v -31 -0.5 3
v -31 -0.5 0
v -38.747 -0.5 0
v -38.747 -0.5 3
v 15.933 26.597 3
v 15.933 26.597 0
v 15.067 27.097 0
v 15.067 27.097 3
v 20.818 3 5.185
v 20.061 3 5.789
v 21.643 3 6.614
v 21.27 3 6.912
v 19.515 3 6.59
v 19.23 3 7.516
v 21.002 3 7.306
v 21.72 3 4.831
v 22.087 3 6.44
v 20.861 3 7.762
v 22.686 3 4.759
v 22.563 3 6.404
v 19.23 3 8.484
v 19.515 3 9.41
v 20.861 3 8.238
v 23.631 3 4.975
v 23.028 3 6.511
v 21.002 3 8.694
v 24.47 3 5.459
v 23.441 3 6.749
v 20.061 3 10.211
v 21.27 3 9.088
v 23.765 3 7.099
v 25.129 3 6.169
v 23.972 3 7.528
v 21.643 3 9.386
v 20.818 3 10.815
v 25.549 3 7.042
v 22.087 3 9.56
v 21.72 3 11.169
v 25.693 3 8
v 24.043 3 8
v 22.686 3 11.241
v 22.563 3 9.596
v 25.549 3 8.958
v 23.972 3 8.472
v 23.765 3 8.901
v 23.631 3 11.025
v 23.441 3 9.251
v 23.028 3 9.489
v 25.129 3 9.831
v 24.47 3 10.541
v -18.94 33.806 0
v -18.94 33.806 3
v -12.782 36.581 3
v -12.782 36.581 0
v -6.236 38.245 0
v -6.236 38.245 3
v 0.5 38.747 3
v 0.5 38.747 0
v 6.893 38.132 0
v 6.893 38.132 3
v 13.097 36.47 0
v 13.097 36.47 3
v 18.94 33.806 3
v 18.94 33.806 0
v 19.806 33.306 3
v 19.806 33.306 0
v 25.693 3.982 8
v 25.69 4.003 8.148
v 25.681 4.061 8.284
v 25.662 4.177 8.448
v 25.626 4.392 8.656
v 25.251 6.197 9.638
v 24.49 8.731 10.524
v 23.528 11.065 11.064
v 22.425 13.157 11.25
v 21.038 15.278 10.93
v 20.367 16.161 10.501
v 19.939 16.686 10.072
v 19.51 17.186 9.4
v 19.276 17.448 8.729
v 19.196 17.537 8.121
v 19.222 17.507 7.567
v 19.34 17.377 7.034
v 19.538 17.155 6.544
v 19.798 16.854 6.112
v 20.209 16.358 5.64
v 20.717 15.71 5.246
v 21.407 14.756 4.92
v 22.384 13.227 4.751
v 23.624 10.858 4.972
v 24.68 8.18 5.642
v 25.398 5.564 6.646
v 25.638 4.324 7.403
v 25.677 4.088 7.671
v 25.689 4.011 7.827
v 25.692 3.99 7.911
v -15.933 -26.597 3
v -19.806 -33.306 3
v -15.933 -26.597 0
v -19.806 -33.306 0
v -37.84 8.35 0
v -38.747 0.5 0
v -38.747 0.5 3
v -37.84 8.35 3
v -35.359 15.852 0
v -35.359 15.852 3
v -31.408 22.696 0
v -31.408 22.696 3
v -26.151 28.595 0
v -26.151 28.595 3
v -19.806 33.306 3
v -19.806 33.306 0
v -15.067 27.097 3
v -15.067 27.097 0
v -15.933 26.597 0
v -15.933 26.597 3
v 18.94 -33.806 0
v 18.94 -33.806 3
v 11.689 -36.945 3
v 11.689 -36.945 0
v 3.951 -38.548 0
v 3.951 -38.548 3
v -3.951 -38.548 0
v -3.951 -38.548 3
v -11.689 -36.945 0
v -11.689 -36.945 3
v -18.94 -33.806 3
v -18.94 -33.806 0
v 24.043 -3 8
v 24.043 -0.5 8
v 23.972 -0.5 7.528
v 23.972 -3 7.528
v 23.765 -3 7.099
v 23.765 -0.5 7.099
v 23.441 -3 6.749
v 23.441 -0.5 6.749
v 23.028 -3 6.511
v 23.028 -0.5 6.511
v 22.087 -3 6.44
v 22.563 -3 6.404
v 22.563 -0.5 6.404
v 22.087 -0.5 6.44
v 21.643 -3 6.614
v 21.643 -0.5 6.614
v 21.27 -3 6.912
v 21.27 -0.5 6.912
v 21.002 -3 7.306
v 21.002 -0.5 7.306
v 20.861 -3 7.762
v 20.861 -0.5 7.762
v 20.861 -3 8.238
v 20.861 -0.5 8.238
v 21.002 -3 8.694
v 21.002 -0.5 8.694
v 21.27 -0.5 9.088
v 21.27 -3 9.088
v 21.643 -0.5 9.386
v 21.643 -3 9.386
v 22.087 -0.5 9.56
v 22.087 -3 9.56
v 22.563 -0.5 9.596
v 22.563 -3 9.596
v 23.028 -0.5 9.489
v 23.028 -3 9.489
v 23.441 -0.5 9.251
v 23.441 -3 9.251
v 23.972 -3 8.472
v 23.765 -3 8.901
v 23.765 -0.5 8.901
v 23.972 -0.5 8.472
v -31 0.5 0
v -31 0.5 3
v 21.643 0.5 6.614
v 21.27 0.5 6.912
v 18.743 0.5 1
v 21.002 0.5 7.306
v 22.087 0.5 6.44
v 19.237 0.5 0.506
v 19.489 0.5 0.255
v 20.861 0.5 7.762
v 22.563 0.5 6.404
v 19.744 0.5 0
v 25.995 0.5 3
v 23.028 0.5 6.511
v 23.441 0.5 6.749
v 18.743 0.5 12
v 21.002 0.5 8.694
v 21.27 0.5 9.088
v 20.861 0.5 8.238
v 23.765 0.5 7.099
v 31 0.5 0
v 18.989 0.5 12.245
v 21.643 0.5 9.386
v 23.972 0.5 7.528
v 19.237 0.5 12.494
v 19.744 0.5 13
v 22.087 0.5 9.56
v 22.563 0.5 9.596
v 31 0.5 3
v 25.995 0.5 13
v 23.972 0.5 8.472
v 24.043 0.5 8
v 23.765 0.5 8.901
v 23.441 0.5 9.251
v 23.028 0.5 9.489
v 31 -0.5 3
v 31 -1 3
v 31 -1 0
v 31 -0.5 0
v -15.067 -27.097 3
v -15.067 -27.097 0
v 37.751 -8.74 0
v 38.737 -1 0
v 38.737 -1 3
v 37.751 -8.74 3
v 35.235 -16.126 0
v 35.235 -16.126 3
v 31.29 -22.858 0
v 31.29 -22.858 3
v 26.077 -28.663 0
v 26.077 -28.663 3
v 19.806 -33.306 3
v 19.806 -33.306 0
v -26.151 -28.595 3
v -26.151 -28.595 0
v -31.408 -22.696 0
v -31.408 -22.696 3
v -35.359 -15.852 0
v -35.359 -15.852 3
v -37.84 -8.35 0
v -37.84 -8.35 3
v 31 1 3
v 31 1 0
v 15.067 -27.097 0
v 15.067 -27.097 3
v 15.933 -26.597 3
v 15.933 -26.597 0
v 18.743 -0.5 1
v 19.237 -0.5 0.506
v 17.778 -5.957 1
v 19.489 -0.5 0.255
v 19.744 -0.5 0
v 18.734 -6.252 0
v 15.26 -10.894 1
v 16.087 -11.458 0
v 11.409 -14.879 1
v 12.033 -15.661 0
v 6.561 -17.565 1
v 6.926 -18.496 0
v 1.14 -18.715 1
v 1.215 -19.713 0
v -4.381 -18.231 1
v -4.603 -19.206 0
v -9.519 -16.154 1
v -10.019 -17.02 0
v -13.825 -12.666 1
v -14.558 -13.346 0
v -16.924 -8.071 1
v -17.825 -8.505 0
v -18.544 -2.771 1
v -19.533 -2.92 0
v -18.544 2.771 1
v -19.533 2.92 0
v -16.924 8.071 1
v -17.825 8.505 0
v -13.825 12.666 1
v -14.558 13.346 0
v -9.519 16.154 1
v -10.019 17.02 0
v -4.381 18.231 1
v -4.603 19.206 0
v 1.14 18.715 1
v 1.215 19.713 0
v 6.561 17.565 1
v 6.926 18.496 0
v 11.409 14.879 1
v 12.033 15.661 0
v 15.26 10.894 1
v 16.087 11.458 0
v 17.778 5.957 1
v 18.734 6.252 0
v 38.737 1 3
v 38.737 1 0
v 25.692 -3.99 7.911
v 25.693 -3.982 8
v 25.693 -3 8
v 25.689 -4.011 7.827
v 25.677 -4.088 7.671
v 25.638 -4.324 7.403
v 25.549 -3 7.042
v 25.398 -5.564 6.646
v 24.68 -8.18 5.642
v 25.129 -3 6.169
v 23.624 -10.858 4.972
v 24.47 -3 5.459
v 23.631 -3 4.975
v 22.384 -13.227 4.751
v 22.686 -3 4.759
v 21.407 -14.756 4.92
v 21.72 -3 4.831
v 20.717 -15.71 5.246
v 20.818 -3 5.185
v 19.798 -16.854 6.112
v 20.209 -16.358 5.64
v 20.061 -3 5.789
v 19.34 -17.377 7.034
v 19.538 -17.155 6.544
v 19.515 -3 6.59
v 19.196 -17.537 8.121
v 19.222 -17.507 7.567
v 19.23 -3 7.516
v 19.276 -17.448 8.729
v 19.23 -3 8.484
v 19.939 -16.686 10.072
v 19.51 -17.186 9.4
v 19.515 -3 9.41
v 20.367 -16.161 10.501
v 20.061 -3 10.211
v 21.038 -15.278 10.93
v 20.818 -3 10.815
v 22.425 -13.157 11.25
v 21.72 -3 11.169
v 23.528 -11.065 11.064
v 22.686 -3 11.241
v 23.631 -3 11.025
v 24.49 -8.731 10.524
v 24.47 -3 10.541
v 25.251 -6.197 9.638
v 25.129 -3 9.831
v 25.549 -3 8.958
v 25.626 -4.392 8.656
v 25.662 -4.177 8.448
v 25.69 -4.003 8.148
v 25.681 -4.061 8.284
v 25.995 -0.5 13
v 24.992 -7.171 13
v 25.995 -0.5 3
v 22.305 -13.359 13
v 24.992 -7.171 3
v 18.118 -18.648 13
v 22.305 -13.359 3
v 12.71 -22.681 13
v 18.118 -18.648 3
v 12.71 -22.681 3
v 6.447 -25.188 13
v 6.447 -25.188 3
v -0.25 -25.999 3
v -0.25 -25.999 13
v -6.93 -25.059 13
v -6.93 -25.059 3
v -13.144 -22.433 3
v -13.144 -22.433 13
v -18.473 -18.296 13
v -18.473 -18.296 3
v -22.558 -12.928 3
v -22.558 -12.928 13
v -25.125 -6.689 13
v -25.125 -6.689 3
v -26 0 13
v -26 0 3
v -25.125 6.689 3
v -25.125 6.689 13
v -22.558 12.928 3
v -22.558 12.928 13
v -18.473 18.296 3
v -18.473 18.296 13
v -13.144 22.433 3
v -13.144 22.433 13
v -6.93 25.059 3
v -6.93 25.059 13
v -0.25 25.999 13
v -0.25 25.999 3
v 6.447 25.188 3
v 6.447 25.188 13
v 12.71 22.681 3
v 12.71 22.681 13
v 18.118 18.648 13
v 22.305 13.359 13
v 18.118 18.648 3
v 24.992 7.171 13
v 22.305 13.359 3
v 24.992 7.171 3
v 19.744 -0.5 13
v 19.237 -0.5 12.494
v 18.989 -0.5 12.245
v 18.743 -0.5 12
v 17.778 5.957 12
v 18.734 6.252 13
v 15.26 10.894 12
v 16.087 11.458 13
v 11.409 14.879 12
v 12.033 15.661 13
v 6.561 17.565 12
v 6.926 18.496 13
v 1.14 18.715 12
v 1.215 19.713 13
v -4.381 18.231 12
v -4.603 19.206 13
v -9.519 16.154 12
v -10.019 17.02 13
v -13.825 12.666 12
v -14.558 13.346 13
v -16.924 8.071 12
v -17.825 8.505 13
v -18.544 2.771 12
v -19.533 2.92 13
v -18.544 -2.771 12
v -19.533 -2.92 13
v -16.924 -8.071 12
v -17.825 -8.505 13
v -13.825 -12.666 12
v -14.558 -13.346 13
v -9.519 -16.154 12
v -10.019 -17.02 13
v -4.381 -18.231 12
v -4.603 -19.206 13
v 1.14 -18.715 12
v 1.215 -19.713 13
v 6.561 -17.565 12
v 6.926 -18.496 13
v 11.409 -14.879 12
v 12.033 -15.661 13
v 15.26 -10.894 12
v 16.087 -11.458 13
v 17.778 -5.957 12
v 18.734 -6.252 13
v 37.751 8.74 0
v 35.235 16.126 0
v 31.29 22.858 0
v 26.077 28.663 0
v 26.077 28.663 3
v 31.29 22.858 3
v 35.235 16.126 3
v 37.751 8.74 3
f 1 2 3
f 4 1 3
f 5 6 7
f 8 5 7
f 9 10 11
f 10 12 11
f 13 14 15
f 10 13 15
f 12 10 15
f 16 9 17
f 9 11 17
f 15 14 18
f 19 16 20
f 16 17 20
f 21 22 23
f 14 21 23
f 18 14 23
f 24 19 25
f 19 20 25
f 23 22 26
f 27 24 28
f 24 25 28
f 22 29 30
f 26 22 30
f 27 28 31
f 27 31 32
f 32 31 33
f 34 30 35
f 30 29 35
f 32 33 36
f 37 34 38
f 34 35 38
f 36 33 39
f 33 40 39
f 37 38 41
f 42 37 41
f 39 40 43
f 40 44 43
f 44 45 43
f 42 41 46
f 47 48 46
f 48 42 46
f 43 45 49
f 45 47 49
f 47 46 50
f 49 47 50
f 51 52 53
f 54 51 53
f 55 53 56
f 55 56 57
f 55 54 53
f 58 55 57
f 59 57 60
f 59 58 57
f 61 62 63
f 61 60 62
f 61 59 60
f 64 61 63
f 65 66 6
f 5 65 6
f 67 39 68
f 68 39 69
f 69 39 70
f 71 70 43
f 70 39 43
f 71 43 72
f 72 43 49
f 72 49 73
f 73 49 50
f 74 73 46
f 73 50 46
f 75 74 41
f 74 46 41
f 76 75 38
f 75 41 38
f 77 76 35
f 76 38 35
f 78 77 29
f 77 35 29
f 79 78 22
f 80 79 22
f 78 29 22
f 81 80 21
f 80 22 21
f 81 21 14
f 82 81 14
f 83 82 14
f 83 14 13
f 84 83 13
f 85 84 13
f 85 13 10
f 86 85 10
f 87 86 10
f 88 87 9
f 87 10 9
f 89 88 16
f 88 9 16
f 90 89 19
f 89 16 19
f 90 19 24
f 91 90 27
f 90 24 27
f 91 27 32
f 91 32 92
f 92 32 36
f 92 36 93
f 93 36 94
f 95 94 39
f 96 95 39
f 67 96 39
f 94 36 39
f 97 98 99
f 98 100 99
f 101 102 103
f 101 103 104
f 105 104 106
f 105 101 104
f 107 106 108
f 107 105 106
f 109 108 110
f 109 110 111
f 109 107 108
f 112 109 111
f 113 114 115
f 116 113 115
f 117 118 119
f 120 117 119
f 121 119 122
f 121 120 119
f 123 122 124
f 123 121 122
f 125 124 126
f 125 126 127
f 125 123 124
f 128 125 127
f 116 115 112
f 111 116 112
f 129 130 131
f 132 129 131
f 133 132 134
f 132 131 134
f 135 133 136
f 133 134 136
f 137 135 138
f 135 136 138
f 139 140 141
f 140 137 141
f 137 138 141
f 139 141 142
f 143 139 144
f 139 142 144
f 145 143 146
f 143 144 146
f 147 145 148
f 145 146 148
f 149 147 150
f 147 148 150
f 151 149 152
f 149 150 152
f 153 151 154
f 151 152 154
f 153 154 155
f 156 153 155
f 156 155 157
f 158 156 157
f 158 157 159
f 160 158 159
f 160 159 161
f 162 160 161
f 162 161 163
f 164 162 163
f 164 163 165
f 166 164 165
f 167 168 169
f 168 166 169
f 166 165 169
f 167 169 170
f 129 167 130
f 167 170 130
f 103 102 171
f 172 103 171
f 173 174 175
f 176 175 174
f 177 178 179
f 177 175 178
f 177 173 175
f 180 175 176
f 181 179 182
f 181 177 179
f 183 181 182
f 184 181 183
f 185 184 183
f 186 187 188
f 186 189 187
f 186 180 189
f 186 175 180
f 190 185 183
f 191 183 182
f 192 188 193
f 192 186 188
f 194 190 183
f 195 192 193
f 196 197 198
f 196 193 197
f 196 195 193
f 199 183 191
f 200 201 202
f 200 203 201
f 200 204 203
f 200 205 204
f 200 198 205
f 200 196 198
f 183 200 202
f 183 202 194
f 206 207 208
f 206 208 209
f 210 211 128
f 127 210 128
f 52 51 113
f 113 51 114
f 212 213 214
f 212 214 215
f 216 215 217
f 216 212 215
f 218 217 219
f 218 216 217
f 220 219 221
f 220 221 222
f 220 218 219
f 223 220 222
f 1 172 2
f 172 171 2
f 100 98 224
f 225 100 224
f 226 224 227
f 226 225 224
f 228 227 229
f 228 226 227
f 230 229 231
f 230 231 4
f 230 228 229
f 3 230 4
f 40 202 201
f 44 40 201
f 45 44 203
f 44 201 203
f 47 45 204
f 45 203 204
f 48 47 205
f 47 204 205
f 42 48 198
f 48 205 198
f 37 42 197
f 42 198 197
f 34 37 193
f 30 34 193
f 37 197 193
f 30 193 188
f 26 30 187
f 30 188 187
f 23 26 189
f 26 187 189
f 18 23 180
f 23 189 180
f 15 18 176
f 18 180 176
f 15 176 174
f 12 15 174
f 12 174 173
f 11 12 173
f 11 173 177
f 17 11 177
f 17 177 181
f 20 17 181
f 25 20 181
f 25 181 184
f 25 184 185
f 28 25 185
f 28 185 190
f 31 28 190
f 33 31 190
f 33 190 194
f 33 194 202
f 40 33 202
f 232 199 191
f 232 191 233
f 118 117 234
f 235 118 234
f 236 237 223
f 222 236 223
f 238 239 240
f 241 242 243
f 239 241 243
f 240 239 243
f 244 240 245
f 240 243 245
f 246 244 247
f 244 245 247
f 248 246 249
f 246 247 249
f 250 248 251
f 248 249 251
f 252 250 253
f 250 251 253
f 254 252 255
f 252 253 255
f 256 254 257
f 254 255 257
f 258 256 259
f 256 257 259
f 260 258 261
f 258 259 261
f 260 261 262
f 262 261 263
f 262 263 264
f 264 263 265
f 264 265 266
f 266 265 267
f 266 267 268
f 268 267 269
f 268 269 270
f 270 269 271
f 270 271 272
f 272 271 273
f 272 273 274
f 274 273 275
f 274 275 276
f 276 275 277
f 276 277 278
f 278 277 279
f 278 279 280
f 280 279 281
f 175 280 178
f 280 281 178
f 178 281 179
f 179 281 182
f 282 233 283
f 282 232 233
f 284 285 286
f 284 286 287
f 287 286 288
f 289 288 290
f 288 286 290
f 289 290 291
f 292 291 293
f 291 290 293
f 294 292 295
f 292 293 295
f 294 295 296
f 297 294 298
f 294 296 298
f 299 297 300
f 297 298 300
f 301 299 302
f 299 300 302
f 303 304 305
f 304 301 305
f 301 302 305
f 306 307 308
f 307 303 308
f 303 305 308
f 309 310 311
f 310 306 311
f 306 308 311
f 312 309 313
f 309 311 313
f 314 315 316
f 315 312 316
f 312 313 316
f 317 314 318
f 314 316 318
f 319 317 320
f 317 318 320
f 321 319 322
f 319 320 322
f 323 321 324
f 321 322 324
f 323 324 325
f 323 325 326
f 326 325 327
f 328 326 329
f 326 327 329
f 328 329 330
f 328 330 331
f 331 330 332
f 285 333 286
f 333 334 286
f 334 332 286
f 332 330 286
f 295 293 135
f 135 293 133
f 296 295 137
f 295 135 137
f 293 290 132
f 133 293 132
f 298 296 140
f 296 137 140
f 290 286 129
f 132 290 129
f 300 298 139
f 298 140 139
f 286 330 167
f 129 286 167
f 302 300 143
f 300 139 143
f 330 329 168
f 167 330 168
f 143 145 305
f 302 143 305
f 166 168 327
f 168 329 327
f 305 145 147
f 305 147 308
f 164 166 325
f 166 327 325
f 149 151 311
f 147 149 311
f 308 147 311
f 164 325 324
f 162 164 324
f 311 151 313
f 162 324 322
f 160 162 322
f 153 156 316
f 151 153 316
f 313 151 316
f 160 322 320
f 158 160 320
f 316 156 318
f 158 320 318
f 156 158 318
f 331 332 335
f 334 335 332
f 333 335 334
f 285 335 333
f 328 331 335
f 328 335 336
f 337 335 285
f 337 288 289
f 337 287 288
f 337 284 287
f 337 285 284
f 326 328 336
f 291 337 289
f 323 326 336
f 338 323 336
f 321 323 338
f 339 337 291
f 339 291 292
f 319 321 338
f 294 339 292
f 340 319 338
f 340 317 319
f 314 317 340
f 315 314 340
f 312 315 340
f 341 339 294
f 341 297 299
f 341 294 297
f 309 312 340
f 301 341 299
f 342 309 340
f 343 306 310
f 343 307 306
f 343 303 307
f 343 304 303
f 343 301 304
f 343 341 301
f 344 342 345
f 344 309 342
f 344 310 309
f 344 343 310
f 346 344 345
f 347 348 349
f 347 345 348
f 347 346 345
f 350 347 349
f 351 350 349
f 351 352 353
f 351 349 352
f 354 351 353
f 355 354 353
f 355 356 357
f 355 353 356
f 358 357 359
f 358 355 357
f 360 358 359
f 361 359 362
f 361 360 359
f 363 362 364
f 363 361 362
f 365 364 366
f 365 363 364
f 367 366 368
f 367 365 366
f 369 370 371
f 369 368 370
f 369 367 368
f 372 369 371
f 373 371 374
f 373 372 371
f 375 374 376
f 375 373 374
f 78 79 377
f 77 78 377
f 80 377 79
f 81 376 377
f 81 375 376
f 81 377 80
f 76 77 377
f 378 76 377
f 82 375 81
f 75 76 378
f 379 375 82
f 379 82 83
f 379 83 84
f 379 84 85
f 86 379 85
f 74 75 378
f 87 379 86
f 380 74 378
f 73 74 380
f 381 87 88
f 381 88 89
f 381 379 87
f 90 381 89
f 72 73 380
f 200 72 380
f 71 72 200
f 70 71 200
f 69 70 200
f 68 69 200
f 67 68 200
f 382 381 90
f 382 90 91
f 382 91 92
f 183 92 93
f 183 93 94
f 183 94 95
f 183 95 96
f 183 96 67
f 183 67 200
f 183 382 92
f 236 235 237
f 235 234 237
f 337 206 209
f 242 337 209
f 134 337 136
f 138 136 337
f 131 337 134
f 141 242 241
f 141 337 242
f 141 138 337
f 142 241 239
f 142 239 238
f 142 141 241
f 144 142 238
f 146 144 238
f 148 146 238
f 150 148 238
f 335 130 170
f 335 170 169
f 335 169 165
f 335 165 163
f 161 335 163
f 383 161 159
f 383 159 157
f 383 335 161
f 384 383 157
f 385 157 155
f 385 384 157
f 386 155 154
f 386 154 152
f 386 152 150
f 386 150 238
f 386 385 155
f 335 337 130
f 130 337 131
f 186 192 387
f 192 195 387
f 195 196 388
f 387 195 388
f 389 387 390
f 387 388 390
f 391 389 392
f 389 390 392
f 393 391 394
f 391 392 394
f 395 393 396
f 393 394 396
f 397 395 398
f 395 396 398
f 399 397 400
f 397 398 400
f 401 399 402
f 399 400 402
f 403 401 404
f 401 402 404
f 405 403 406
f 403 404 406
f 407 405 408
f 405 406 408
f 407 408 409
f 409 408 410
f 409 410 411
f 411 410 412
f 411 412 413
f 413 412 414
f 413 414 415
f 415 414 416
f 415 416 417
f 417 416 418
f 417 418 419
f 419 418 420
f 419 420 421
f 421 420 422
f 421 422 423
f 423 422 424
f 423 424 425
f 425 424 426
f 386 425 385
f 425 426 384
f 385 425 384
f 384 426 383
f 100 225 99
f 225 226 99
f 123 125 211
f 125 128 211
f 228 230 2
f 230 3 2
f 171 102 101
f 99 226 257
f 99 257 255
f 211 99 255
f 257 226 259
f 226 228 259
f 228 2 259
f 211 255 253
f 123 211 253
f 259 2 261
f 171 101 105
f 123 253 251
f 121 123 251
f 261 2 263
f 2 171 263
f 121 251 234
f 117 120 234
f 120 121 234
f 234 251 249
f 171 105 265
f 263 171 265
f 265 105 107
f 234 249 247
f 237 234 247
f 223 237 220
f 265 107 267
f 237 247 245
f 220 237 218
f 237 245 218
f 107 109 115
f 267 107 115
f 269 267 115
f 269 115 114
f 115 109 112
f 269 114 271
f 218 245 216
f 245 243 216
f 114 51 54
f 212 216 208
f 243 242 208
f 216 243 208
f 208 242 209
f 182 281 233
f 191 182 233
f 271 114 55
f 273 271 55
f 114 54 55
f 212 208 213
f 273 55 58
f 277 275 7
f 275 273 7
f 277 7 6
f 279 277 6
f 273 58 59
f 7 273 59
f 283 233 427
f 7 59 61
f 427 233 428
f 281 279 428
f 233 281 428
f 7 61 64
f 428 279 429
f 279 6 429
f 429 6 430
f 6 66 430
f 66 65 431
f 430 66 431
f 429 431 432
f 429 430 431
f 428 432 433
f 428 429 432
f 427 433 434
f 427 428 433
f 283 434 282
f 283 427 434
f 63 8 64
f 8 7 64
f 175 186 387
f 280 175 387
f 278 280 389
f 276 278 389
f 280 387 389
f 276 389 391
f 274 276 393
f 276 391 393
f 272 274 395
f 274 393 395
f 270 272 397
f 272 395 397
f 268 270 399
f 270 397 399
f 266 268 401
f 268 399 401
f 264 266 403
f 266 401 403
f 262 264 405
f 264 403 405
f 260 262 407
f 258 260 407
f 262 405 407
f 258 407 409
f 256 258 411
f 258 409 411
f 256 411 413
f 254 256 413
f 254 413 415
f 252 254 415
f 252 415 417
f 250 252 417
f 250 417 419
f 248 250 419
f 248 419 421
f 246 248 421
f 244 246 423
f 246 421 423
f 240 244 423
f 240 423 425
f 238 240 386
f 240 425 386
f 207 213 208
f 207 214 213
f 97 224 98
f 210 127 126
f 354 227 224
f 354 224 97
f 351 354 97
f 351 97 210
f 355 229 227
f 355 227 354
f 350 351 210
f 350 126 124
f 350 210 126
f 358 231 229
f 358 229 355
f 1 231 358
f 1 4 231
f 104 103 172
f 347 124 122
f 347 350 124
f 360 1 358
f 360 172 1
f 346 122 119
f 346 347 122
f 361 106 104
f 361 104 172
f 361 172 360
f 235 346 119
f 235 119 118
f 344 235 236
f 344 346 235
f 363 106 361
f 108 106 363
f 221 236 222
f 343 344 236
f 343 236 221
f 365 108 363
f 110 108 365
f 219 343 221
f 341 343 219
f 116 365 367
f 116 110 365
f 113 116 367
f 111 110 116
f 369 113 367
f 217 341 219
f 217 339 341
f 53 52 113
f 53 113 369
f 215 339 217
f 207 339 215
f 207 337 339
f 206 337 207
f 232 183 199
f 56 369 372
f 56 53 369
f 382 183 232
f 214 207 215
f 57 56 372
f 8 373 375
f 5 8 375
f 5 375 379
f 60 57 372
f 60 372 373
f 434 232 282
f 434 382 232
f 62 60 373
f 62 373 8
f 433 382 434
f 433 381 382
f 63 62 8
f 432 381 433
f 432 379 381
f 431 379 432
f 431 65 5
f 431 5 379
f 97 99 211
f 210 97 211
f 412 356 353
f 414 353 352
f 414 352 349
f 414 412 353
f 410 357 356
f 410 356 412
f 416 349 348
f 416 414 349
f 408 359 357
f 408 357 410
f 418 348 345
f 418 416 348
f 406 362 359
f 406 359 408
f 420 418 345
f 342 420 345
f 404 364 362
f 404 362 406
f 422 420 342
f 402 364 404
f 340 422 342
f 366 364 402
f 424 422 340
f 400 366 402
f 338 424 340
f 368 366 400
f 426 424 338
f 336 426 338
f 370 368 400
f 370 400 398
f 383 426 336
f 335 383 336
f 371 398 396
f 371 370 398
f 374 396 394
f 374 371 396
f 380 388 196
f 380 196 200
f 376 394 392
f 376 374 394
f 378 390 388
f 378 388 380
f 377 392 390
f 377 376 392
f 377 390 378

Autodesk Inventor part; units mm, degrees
ref_plane "YZ Plane" through (0, 0, 0) normal (1, 0, 0) x (0, 1, 0)
ref_plane "XZ Plane" through (0, 0, 0) normal (0, 1, 0) x (-1, 0, 0)
sketch "Sketch1" plane through (0, 0, 0) normal (0, 0, 1) x (1, 0, 0)
  circle A0 centre (0, 0) radius 38.75
  line L0 (-0.5, 39) -> (0.5, 39)
  line L1 (0.5, 39) -> (0.5, 31)
  line L2 (0.5, 31) -> (-0.5, 31)
  line L3 (-0.5, 31) -> (-0.5, 39)
  line L4 (-15.933, 26.5968) -> (-19.933, 33.525)
  line L5 (-19.067, 34.025) -> (-15.067, 27.0968)
  line L6 (-15.067, 27.0968) -> (-15.933, 26.5968)
  line L7 (-19.933, 33.525) -> (-19.067, 34.025)
  line L8 (-27.0968, 15.067) -> (-34.025, 19.067)
  line L9 (-33.525, 19.933) -> (-26.5968, 15.933)
  line L10 (-26.5968, 15.933) -> (-27.0968, 15.067)
  line L11 (-34.025, 19.067) -> (-33.525, 19.933)
  line L12 (-31, -0.5) -> (-39, -0.5)
  line L13 (-39, 0.5) -> (-31, 0.5)
  line L14 (-31, 0.5) -> (-31, -0.5)
  line L15 (-39, -0.5) -> (-39, 0.5)
  line L16 (-26.5968, -15.933) -> (-33.525, -19.933)
  line L17 (-34.025, -19.067) -> (-27.0968, -15.067)
  line L18 (-27.0968, -15.067) -> (-26.5968, -15.933)
  line L19 (-33.525, -19.933) -> (-34.025, -19.067)
  line L20 (-15.067, -27.0968) -> (-19.067, -34.025)
  line L21 (-19.933, -33.525) -> (-15.933, -26.5968)
  line L22 (-15.933, -26.5968) -> (-15.067, -27.0968)
  line L23 (-19.067, -34.025) -> (-19.933, -33.525)
  line L24 (0.5, -31) -> (0.5, -39)
  line L25 (-0.5, -39) -> (-0.5, -31)
  line L26 (-0.5, -31) -> (0.5, -31)
  line L27 (0.5, -39) -> (-0.5, -39)
  line L28 (15.933, -26.5968) -> (19.933, -33.525)
  line L29 (19.067, -34.025) -> (15.067, -27.0968)
  line L30 (15.067, -27.0968) -> (15.933, -26.5968)
  line L31 (19.933, -33.525) -> (19.067, -34.025)
  line L32 (27.0968, -15.067) -> (34.025, -19.067)
  line L33 (33.525, -19.933) -> (26.5968, -15.933)
  line L34 (26.5968, -15.933) -> (27.0968, -15.067)
  line L35 (34.025, -19.067) -> (33.525, -19.933)
  line L36 (31, 0.5) -> (39, 0.5)
  line L37 (39, -0.5) -> (31, -0.5)
  line L38 (31, -0.5) -> (31, 0.5)
  line L39 (39, 0.5) -> (39, -0.5)
  line L40 (26.5968, 15.933) -> (33.525, 19.933)
  line L41 (34.025, 19.067) -> (27.0968, 15.067)
  line L42 (27.0968, 15.067) -> (26.5968, 15.933)
  line L43 (33.525, 19.933) -> (34.025, 19.067)
  line L44 (15.067, 27.0968) -> (19.067, 34.025)
  line L45 (19.933, 33.525) -> (15.933, 26.5968)
  line L46 (15.933, 26.5968) -> (15.067, 27.0968)
  line L47 (19.067, 34.025) -> (19.933, 33.525)
  point P0 (0, 31)
  point P1 (-0.5, 38.7468)
  point P2 (0.5, 38.7468)
  point P3 (-15.5, 26.8468)
  point P4 (-26.8468, 15.5)
  point P5 (-31, 0)
  point P6 (-26.8468, -15.5)
  point P7 (-15.5, -26.8468)
  point P8 (0, -31)
  point P9 (15.5, -26.8468)
  point P10 (26.8468, -15.5)
  point P11 (31, 0)
  point P12 (26.8468, 15.5)
  point P13 (15.5, 26.8468)
  point P14 (-18.9404, 33.8057)
  point P15 (-19.8064, 33.3057)
  point P16 (-33.3057, 19.8064)
  point P17 (-33.8057, 18.9404)
  point P18 (-38.7468, 0.5)
  point P19 (-38.7468, -0.5)
  point P20 (-33.8057, -18.9404)
  point P21 (-33.3057, -19.8064)
  point P22 (-19.8064, -33.3057)
  point P23 (-18.9404, -33.8057)
  point P24 (-0.5, -38.7468)
  point P25 (0.5, -38.7468)
  point P26 (18.9404, -33.8057)
  point P27 (19.8064, -33.3057)
  point P28 (33.3057, -19.8064)
  point P29 (33.8057, -18.9404)
  point P30 (38.7468, -0.5)
  point P31 (38.7468, 0.5)
  point P32 (33.8057, 18.9404)
  point P33 (33.3057, 19.8064)
  point P34 (19.8064, 33.3057)
  point P35 (18.9404, 33.8057)
  dimension "d0" = 77.5
  dimension "d3" = 0.5
  dimension "d4" = 31
  dimension "d9" = 360
extrude "Extrusion1" add sketch "Sketch1" along normal blind 3 contours L36 L38 L37 A0 L32 L34 L33 L28 L30 L29 L24 L26 L25 L20 L22 L21 L16 L18 L17 L12 L14 L13 L8 L10 L9 L4 L6 L5 L3 L2 L1 L44 L46 L45 L40 L42 L41 | L41 L42 L40 A0 | A0 L40 L43 L41 | L32 L35 L33 A0 | A0 L33 L34 L32 | L1 L2 L3 A0 | A0 L3 L0 L1 | L24 L27 L25 A0 | A0 L25 L26 L24 | L9 L10 L8 A0 | A0 L8 L11 L9 | L16 L19 L17 A0 | A0 L17 L18 L16
sketch "Sketch2" plane through (0, 0, 3) normal (0, 0, 1) x (1, 0, 0)
  circle A0 centre (0, 0) radius 18.75
  circle A1 centre (0, 0) radius 26
  dimension "d11" = 37.5
  dimension "d12" = 52
extrude "Extrusion2" add sketch "Sketch2" along normal blind 10
sketch "Sketch3" plane through (0, 0, 3) normal (0, 0, 1) x (1, 0, 0)
  circle A0 centre (0, 0) radius 18.75
extrude "Extrusion3" cut sketch "Sketch3" against normal blind 10
sketch "Sketch4" plane through (0, 0, 13) normal (0, 0, 1) x (1, 0, 0)
  arc A0 (33.8057, -18.9404) -> (38.7468, -0.5) centre (0, 0) ccw projected
  line L0 (38.7468, -0.5) -> (17.4484, -0.5)
  line L1 (17.4484, -0.5) -> (17.4484, 0.5)
  line L2 (17.4484, 0.5) -> (38.7468, 0.5)
  line L3 (38.7468, 0.5) -> (38.7468, -0.5)
  line L4 (31, 1) -> (40.0251, 1)
  line L5 (40.0251, 1) -> (40.0251, -1)
  line L6 (40.0251, -1) -> (31, -1)
  line L7 (31, -1) -> (31, 1)
  point P0 (31, -0.5)
  point P1 (31, 0.5)
  dimension "d19" = 2
  dimension "d20" = 0.5
extrude "Extrusion4" cut sketch "Sketch4" against normal through all
sketch "Sketch5" plane through (18.7433, 0.5, 13) normal (0, -1, 0) x (1, 0, 0)
  circle A0 centre (3.7, -5) radius 1.6
  line L0 (14.5624, -10) -> (1.0631, -10) projected
  line L1 (-37.4933, 0) -> (0, 0) projected
  line L2 (0, 0) -> (0, -10)
  point P0 (-18.7433, -13)
  point P1 (0, -5)
  dimension "d21" = 3.2
  dimension "d22" = 5
  dimension "d23" = 3.7
extrude "Extrusion5" cut sketch "Sketch5" against normal blind 23.5
ref_plane "Work Plane1" through (18.7433, 3, 13) normal (0, -1, 0) x (1, 0, 0)
sketch "Sketch6" plane through (18.7433, 3, 13) normal (0, -1, 0) x (1, 0, 0)
  circle A0 centre (3.7, -5) radius 1.6 projected
  circle A1 centre (3.7, -5) radius 3.25
  point P0 (-18.7433, -13)
  dimension "d27" = 6.5
extrude "Extrusion6" cut sketch "Sketch6" against normal blind 23.5
mirror "Mirror1" about plane through (0, 0, 0) normal (0, 1, 0) of "Extrusion6", "Extrusion5"
chamfer "Chamfer1" distance 1 angle 45 2 edges at (-18.75, 0, 13) (-18.75, 0, 0)
sketch "Sketch7" plane through (0, 0, 3) normal (0, 0, 1) x (1, 0, 0)
  circle A0 centre (0, 0) radius 38.75
  arc A1 (18.9404, 33.8057) -> (0.5, 38.7468) centre (0, 0) ccw projected
  circle A2 centre (0, 0) radius 41.405
extrude "Extrusion7" cut sketch "Sketch7" against normal blind 3
properties part number "disk_6_slot"
